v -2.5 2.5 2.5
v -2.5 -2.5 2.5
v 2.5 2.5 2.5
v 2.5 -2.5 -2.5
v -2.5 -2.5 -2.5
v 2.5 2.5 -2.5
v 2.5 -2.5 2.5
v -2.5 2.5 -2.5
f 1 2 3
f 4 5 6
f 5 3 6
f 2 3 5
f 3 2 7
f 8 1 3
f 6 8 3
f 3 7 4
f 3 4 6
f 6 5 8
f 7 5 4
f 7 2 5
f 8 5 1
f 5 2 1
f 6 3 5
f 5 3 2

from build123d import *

# Parameters (mm, degrees)
EXTRUDE_1_DEPTH = 2.5


with BuildPart() as part:
    # 草图1 → 凸台-拉伸1 (new body, symmetric)
    with BuildSketch(Plane.XY):
        Polygon((-2.5, -2.5), (2.5, -2.5), (2.5, 2.5), align=None)
    extrude(amount=EXTRUDE_1_DEPTH, both=True)


with BuildPart() as body_2:
    # 镜向2: mirrored copy
    add(part.part.mirror(Plane(origin=(2.5, 2.5, 2.5), x_dir=(0, 0, 1), z_dir=(0.707106781, -0.707106781, 0))))


solid = Compound([part.part, body_2.part])
